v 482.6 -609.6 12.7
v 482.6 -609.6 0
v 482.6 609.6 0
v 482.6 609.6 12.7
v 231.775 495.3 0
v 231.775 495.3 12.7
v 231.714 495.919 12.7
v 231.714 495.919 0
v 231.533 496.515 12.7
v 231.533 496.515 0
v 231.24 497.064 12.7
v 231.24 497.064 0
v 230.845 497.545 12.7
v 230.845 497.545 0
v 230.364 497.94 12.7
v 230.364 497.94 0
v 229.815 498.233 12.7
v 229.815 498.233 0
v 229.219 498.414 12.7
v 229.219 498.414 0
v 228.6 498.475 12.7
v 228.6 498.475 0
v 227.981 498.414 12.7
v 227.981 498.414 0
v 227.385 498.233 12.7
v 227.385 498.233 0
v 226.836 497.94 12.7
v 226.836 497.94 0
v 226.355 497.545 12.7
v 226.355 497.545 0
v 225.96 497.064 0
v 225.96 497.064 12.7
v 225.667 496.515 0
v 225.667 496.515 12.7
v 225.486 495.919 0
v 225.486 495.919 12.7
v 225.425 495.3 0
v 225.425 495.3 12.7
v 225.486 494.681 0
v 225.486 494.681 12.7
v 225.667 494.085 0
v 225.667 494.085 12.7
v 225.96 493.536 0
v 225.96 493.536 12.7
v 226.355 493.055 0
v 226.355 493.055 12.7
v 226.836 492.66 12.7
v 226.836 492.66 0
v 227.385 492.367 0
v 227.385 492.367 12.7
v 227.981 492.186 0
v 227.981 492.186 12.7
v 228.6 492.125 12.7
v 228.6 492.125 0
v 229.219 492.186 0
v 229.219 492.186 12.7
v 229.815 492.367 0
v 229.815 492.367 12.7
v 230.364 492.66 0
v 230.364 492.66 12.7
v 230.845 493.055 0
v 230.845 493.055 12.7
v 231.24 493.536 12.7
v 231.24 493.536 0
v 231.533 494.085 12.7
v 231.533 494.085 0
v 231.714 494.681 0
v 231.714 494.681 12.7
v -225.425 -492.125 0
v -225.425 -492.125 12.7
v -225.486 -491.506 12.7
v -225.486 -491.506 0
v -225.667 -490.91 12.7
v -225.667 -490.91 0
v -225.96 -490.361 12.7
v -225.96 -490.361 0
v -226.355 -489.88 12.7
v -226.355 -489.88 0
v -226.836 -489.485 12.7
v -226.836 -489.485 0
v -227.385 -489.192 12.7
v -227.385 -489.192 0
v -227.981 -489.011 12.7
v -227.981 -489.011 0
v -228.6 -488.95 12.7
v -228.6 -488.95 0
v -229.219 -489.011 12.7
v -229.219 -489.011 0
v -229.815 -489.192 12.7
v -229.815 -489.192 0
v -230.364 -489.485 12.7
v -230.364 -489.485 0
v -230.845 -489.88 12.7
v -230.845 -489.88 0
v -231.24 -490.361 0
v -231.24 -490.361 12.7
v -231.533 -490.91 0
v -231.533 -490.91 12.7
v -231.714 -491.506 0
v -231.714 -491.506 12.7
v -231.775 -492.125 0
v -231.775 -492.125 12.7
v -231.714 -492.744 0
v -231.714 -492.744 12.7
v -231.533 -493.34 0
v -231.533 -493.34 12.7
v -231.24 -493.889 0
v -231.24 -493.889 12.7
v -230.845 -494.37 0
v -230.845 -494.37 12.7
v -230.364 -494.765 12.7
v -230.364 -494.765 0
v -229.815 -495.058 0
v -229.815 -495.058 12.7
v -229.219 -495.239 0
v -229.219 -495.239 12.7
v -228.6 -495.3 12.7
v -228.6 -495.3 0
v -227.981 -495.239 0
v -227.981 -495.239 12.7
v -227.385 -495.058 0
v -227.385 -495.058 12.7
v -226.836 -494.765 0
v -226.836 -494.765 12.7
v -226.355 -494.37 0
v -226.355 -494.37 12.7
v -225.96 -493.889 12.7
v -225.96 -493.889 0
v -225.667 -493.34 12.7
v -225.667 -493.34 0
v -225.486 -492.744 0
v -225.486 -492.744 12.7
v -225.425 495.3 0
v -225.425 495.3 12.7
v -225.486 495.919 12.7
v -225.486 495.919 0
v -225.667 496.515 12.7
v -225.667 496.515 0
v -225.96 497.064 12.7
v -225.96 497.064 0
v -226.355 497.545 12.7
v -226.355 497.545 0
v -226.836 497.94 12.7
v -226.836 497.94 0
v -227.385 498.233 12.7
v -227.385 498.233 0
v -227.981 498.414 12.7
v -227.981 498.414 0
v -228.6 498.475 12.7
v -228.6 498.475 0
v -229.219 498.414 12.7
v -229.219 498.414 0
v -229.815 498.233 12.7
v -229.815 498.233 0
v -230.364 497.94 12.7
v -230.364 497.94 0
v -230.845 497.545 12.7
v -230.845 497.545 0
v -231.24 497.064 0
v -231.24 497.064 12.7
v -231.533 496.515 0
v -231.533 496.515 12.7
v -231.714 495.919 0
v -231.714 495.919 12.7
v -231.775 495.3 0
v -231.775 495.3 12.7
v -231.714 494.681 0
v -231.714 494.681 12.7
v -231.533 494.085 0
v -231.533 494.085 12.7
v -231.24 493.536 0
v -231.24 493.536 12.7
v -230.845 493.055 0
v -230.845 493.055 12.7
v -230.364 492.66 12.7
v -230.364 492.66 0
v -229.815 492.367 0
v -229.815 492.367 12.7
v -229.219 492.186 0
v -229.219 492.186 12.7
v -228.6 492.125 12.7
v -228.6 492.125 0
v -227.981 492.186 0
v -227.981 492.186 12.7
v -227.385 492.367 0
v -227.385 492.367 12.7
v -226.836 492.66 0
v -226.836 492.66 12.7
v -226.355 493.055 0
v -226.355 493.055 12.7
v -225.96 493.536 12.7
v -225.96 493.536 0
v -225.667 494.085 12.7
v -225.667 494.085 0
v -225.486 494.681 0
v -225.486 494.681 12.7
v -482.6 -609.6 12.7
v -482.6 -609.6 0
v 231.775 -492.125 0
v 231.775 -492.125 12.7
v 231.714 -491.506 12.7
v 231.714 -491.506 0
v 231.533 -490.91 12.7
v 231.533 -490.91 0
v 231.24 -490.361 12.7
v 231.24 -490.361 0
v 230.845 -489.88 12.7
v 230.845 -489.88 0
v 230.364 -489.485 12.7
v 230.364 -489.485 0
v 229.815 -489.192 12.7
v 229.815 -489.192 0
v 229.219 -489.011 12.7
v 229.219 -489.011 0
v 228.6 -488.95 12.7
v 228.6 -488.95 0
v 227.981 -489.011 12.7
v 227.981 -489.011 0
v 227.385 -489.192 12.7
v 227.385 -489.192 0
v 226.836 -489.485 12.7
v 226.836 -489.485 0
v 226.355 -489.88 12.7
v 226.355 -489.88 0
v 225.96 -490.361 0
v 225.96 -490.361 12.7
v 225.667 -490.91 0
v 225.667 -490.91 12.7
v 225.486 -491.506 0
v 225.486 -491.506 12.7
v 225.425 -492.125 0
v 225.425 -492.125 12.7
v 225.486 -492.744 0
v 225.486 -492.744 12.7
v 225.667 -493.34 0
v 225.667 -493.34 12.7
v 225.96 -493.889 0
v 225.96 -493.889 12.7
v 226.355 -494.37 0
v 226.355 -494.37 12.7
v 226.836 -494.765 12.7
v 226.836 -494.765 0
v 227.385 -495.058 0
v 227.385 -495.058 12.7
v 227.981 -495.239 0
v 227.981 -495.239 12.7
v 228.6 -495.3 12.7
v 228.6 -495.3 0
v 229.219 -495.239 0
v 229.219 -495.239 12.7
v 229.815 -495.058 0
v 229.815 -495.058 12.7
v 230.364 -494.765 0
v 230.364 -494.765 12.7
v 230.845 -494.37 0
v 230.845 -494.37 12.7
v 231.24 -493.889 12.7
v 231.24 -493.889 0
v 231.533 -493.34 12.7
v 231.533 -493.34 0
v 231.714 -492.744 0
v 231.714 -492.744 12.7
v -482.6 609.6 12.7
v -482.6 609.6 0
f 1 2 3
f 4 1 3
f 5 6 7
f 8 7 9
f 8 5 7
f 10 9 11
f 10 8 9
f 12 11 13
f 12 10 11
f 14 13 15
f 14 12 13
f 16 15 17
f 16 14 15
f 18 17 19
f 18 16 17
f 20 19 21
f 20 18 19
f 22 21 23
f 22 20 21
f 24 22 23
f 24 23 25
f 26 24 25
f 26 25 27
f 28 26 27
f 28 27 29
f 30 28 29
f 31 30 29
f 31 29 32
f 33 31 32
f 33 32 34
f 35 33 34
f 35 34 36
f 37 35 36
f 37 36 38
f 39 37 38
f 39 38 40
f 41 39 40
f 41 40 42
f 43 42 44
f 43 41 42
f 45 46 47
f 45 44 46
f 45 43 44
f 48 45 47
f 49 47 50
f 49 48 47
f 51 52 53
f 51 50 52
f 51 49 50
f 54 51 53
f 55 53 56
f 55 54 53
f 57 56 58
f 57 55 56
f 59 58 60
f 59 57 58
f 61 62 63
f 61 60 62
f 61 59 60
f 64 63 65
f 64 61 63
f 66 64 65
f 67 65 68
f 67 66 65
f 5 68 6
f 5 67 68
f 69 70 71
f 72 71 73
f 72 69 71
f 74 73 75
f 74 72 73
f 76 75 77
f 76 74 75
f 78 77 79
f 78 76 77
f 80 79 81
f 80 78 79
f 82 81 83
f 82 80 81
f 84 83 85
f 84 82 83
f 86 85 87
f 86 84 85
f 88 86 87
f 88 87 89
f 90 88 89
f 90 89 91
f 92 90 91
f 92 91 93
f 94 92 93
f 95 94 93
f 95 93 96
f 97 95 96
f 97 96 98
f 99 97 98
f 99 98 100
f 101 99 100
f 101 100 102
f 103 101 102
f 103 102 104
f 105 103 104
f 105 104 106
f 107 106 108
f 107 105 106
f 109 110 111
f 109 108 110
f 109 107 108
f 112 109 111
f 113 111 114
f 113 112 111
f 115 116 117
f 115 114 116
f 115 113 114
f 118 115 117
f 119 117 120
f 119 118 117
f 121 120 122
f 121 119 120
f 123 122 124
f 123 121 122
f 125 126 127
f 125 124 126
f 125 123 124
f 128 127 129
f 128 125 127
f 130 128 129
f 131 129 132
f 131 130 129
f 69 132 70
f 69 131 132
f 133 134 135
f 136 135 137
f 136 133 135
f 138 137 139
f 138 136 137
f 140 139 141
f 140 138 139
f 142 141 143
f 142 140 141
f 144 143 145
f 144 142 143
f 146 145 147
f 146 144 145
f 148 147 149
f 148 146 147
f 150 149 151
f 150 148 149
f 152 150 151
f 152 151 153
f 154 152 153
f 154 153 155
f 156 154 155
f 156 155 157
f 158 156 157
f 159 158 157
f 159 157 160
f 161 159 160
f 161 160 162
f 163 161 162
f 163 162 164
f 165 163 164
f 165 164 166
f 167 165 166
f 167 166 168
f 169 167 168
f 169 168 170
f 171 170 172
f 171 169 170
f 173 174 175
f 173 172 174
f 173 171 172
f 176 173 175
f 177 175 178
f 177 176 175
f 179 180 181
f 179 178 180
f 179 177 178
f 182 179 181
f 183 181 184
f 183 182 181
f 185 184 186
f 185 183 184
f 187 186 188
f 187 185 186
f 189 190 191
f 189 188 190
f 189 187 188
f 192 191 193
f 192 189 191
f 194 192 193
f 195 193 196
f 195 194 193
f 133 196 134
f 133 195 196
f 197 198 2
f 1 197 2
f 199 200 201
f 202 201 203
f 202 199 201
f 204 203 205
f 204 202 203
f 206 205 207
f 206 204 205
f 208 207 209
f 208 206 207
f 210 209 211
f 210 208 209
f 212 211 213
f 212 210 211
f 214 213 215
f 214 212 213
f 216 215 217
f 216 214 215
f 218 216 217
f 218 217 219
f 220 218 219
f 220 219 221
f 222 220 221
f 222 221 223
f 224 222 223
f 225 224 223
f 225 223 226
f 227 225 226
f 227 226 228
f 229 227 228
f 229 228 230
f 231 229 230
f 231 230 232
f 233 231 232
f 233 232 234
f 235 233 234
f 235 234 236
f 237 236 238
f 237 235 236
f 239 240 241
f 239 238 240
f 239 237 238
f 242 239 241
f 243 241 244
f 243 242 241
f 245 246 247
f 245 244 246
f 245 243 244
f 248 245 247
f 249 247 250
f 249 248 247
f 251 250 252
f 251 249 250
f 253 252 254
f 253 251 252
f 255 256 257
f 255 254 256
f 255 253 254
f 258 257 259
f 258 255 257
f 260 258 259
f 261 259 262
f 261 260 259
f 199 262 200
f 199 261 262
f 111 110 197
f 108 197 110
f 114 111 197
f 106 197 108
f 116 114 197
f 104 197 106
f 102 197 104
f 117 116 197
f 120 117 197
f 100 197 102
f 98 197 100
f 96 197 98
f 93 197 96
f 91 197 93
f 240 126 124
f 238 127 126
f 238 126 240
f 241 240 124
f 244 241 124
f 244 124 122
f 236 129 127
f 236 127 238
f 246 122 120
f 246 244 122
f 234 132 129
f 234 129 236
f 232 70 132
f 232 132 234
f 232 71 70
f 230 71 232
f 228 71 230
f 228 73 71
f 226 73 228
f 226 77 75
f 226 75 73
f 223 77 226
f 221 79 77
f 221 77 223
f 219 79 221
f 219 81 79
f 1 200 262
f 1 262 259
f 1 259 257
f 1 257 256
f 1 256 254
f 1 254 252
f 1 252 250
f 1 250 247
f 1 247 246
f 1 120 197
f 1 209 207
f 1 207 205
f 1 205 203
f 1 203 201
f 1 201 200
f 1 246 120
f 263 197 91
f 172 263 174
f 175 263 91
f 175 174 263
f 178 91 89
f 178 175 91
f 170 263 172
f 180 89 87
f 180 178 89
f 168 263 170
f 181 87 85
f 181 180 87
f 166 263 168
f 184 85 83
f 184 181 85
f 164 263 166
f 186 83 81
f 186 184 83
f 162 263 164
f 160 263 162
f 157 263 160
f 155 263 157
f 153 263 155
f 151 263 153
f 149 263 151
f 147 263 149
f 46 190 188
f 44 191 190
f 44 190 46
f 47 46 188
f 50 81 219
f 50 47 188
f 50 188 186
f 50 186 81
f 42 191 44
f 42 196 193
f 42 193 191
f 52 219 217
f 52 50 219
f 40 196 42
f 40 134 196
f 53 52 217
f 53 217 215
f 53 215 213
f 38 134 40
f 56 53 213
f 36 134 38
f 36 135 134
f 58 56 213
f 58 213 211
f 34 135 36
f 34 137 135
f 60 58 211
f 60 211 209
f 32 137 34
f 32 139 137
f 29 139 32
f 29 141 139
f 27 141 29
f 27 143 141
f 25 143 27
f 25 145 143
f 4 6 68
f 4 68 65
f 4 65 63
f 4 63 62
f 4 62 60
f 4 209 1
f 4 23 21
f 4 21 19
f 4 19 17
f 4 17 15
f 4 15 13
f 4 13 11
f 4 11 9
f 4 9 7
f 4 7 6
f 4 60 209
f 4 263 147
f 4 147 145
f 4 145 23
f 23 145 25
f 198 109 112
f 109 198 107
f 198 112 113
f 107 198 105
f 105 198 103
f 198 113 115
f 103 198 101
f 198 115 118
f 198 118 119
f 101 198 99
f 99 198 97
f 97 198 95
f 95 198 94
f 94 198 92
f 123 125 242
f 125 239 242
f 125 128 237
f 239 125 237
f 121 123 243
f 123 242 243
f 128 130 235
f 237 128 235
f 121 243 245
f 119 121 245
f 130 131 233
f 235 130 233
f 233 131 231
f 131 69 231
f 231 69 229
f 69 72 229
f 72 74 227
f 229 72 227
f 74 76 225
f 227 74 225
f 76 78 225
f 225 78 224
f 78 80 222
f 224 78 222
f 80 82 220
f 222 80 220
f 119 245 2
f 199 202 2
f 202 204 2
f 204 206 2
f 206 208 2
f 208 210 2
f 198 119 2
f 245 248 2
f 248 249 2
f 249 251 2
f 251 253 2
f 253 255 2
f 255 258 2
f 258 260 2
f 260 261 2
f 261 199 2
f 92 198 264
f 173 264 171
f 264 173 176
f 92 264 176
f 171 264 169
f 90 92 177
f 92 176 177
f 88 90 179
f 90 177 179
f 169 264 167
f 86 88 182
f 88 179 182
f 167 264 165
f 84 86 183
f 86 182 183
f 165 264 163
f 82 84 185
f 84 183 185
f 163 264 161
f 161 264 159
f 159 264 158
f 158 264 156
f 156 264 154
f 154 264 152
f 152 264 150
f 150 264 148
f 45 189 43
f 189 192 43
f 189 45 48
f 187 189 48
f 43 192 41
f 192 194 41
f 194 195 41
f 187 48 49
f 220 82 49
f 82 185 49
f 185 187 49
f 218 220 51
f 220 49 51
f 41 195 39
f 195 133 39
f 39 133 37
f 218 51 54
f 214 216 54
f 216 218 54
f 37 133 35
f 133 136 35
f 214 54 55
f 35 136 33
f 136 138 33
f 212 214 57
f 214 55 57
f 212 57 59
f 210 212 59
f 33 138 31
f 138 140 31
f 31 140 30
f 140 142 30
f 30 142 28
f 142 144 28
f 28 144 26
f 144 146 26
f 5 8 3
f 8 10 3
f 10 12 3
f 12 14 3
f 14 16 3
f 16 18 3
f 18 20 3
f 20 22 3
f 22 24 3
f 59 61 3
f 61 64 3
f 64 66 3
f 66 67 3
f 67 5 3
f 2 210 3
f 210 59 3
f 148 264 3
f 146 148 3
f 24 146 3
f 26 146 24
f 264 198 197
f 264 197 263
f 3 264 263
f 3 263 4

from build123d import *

# Parameters (mm, degrees)
F0_W     = 965.2
F0_H     = 1219.2
F1_DEPTH = 12.7
F2_R     = 3.175
F3_DEPTH = 25.4
F4_R     = 3.175
F5_DEPTH = 25.4


with BuildPart() as f1:
    # F0 (on Top) → F1 (new body)
    with BuildSketch(Plane.XY):
        Rectangle(F0_W, F0_H)
    extrude(amount=F1_DEPTH)

    # F2 (on Top) → F3 (cut)
    with BuildSketch(Plane.XY):
        with Locations((-228.6, -492.125)):
            Circle(F2_R)
        with Locations((228.6, -492.125)):
            Circle(F2_R)
    extrude(amount=F3_DEPTH, mode=Mode.SUBTRACT)

    # F4 (on Top) → F5 (cut)
    with BuildSketch(Plane.XY):
        with Locations((-228.6, 495.3)):
            Circle(F4_R)
        with Locations((228.6, 495.3)):
            Circle(F4_R)
    extrude(amount=F5_DEPTH, mode=Mode.SUBTRACT)


solid = f1.part
